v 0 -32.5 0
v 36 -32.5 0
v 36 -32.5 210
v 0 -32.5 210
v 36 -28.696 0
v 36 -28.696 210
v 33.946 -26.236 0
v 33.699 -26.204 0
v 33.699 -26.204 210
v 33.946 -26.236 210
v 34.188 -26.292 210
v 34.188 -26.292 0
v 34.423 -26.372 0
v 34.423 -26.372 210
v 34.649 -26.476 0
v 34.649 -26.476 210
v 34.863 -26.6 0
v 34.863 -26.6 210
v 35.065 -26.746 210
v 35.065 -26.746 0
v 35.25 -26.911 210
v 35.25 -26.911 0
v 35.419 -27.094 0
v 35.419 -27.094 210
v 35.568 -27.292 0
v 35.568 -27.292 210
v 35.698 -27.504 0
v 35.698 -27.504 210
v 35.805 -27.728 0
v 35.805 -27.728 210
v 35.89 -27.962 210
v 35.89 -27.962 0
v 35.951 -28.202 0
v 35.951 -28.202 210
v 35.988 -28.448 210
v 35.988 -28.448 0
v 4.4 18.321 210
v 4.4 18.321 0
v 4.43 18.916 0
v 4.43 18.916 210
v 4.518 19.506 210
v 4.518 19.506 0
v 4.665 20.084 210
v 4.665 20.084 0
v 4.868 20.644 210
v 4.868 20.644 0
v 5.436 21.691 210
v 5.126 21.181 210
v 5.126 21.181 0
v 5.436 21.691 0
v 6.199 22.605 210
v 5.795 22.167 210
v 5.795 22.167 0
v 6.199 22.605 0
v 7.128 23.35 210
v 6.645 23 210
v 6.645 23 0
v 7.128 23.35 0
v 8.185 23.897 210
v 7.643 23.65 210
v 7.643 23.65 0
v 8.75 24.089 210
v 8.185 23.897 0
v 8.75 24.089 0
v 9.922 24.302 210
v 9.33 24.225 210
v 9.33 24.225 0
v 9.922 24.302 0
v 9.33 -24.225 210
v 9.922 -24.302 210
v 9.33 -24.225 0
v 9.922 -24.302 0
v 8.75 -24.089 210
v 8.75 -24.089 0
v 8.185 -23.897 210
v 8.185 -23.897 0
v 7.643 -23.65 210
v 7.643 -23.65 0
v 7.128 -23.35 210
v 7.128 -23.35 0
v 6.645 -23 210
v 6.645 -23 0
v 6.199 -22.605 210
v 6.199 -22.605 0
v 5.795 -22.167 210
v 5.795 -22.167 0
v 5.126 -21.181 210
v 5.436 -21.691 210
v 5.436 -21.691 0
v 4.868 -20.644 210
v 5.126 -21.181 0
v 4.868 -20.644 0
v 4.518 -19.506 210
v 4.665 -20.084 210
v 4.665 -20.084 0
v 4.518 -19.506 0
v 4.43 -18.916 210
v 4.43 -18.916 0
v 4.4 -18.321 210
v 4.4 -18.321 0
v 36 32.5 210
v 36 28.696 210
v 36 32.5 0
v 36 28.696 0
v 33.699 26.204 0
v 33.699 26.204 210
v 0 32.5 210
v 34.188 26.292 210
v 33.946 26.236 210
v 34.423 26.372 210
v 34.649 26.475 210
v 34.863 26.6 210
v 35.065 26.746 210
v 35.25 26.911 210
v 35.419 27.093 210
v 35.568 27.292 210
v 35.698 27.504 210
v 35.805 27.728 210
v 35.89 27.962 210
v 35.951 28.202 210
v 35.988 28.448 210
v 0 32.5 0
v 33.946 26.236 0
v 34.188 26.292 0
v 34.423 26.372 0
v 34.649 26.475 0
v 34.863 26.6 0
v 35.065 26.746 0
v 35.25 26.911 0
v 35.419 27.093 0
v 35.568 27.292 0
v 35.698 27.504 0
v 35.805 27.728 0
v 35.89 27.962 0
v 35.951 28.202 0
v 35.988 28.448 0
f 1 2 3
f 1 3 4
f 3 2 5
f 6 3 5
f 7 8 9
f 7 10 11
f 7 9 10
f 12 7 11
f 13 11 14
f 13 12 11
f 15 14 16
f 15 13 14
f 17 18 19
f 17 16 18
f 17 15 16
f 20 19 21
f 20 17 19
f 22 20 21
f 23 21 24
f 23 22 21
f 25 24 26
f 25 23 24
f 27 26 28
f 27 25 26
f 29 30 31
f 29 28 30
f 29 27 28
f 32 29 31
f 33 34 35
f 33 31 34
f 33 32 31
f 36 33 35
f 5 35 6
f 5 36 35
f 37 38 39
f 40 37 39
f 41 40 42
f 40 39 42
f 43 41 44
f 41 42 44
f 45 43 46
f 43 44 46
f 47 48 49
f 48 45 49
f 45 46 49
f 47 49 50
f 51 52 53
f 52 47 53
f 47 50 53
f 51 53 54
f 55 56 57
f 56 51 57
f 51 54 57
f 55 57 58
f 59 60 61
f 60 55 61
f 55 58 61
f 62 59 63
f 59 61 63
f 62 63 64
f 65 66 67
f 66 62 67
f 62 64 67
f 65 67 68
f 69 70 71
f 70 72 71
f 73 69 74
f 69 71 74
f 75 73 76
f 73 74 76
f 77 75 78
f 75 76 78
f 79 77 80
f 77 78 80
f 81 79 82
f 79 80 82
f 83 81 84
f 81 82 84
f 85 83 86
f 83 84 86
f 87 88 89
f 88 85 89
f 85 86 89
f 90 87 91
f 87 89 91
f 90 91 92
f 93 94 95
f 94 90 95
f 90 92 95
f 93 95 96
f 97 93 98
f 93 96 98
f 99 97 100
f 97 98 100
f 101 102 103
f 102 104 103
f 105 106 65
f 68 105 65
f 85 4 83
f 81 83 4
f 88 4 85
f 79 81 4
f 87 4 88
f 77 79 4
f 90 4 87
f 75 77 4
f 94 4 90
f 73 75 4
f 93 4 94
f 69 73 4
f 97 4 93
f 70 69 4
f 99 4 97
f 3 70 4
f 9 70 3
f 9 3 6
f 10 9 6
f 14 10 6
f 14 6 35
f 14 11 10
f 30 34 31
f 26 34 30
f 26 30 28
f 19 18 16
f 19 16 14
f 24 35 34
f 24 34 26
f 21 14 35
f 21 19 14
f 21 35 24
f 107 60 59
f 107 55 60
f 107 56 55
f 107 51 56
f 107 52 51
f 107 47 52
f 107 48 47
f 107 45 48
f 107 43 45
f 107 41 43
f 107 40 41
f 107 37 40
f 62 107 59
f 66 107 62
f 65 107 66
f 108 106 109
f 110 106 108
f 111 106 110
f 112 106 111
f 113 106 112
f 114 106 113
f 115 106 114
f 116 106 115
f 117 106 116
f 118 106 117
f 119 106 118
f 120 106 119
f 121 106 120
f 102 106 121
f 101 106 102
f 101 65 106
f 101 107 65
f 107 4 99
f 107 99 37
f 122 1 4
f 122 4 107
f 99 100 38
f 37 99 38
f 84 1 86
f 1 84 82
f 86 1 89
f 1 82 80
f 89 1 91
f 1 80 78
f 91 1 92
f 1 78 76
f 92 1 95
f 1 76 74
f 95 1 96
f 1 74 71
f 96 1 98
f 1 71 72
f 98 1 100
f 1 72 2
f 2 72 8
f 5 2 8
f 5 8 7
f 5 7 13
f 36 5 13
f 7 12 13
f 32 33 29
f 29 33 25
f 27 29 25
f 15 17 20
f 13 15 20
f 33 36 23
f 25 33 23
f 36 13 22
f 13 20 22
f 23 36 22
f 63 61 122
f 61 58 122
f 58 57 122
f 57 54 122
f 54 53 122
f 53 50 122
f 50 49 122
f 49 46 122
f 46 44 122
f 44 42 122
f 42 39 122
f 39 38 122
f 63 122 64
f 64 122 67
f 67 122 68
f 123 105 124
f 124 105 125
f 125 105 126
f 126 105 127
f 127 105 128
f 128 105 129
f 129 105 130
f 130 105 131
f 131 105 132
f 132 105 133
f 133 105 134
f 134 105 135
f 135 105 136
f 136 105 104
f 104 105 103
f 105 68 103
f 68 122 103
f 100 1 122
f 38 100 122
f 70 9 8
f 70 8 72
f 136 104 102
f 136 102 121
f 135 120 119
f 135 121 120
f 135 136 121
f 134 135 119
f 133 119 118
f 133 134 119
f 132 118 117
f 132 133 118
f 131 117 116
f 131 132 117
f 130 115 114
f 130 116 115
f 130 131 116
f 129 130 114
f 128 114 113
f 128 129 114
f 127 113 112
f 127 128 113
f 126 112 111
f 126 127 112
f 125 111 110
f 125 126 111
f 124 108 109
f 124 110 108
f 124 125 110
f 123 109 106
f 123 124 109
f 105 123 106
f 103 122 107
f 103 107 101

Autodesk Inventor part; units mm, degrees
ref_plane "YZ Plane" through (0, 0, 0) normal (1, 0, 0) x (0, 1, 0)
ref_plane "Начальная плоскость" through (0, 0, 0) normal (0, 0, 1) x (1, 0, 0)
ref_plane "Конечная плоскость" through (0, 0, 210) normal (0, 0, 1) x (1, 0, 0)
sketch "Эскиз" plane through (0, 0, 0) normal (0, 0, 1) x (1, 0, 0)
  line L0 (36, -32.5) -> (0, -32.5)
  line L1 (36, -32.5) -> (36, -28.696)
  line L2 (33.6994, -26.2039) -> (9.9215, -24.3017)
  line L3 (4.4, -18.3208) -> (4.4, 18.3208)
  line L4 (33.6994, 26.2039) -> (9.9215, 24.3017)
  line L5 (36, 28.696) -> (36, 32.5)
  line L6 (0, 32.5) -> (36, 32.5)
  line L7 (0, -32.5) -> (0, 32.5)
  arc A0 (4.4, -18.3208) -> (9.9215, -24.3017) centre (10.4, -18.3208) ccw
  arc A1 (9.9215, 24.3017) -> (4.4, 18.3208) centre (10.4, 18.3208) ccw
  arc A2 (36, -28.696) -> (33.6994, -26.2039) centre (33.5, -28.696) ccw
  arc A3 (33.6994, 26.2039) -> (36, 28.696) centre (33.5, 28.696) ccw
  line L8 (0, 45.5) -> (0, -45.5) construction
  line L9 (-7.2974, 0) -> (43.7847, 0) construction
  point P0 (36, -26.388)
  point P1 (4.4, -23.86)
  point P2 (4.4, 23.86)
  point P3 (36, 26.388)
  dimension "d3" = 36
  dimension "d5" = 4.4
  dimension "d7" = 65
  dimension "d9" = 8.64
  dimension "d11" = 8.64
  dimension "d13" = 6.112
  dimension "d15" = 6.112
  dimension "d22" = 6
  dimension "d23" = 2.5
  dimension "d24" = 32.5
  dimension "d25" = 0
extrude "Тело" add sketch "Эскиз" along normal up to surface (210 mm away) from surface at 0
sketch "Sketch3" plane through (0, 0, 0) normal (0, 0, 1) x (1, 0, 0)
  line L0 (0, 0) -> (10, 0)
ref_plane "Work Plane7" through (0, 0, 0) normal (0, -1, 0) x (1, 0, 0)
sketch "Sketch4" plane through (0, 0, 0) normal (0, -1, 0) x (1, 0, 0)
  line L0 (-2, 0) -> (12, 0)
  line L1 (-2, 210) -> (12, 210)
  dimension "d29" = 210
equation "\"d3\" = b"
equation "\"d5\" = t1"
equation "\"d7\" = ParH"
equation "\"d9\" = msp_x1 + t2"
equation "\"d11\" = msp_x1 + t2"
equation "\"d13\" = -msp_x2 + t2"
equation "\"d15\" = -msp_x2 + t2"
equation "\"d22\" = R"
equation "\"d23\" = R1"
equation "\"d24\" = 0.5 * d7"
equation "\"d16\" = G_L"
equation "\"R1\" = 2.5"
equation "\"R\" = 6"
equation "\"t1\" = 4.4"
equation "\"t2\" = 7.2"
equation "\"ParH\" = 65"
equation "\"b\" = 36"
equation "\"msp_x1\" = 0.04 * b"
equation "\"msp_x2\" = -0.08 * t1 + 0.04 * b"
equation "\"G_L\" = d29"
equation "\"ex\" = 0"
equation "\"G_OFFSET_START\" = 0"
equation "\"G_OFFSET_END\" = 0"
properties part number "Швеллер 6.5U-210 ГОСТ 8240-97"
